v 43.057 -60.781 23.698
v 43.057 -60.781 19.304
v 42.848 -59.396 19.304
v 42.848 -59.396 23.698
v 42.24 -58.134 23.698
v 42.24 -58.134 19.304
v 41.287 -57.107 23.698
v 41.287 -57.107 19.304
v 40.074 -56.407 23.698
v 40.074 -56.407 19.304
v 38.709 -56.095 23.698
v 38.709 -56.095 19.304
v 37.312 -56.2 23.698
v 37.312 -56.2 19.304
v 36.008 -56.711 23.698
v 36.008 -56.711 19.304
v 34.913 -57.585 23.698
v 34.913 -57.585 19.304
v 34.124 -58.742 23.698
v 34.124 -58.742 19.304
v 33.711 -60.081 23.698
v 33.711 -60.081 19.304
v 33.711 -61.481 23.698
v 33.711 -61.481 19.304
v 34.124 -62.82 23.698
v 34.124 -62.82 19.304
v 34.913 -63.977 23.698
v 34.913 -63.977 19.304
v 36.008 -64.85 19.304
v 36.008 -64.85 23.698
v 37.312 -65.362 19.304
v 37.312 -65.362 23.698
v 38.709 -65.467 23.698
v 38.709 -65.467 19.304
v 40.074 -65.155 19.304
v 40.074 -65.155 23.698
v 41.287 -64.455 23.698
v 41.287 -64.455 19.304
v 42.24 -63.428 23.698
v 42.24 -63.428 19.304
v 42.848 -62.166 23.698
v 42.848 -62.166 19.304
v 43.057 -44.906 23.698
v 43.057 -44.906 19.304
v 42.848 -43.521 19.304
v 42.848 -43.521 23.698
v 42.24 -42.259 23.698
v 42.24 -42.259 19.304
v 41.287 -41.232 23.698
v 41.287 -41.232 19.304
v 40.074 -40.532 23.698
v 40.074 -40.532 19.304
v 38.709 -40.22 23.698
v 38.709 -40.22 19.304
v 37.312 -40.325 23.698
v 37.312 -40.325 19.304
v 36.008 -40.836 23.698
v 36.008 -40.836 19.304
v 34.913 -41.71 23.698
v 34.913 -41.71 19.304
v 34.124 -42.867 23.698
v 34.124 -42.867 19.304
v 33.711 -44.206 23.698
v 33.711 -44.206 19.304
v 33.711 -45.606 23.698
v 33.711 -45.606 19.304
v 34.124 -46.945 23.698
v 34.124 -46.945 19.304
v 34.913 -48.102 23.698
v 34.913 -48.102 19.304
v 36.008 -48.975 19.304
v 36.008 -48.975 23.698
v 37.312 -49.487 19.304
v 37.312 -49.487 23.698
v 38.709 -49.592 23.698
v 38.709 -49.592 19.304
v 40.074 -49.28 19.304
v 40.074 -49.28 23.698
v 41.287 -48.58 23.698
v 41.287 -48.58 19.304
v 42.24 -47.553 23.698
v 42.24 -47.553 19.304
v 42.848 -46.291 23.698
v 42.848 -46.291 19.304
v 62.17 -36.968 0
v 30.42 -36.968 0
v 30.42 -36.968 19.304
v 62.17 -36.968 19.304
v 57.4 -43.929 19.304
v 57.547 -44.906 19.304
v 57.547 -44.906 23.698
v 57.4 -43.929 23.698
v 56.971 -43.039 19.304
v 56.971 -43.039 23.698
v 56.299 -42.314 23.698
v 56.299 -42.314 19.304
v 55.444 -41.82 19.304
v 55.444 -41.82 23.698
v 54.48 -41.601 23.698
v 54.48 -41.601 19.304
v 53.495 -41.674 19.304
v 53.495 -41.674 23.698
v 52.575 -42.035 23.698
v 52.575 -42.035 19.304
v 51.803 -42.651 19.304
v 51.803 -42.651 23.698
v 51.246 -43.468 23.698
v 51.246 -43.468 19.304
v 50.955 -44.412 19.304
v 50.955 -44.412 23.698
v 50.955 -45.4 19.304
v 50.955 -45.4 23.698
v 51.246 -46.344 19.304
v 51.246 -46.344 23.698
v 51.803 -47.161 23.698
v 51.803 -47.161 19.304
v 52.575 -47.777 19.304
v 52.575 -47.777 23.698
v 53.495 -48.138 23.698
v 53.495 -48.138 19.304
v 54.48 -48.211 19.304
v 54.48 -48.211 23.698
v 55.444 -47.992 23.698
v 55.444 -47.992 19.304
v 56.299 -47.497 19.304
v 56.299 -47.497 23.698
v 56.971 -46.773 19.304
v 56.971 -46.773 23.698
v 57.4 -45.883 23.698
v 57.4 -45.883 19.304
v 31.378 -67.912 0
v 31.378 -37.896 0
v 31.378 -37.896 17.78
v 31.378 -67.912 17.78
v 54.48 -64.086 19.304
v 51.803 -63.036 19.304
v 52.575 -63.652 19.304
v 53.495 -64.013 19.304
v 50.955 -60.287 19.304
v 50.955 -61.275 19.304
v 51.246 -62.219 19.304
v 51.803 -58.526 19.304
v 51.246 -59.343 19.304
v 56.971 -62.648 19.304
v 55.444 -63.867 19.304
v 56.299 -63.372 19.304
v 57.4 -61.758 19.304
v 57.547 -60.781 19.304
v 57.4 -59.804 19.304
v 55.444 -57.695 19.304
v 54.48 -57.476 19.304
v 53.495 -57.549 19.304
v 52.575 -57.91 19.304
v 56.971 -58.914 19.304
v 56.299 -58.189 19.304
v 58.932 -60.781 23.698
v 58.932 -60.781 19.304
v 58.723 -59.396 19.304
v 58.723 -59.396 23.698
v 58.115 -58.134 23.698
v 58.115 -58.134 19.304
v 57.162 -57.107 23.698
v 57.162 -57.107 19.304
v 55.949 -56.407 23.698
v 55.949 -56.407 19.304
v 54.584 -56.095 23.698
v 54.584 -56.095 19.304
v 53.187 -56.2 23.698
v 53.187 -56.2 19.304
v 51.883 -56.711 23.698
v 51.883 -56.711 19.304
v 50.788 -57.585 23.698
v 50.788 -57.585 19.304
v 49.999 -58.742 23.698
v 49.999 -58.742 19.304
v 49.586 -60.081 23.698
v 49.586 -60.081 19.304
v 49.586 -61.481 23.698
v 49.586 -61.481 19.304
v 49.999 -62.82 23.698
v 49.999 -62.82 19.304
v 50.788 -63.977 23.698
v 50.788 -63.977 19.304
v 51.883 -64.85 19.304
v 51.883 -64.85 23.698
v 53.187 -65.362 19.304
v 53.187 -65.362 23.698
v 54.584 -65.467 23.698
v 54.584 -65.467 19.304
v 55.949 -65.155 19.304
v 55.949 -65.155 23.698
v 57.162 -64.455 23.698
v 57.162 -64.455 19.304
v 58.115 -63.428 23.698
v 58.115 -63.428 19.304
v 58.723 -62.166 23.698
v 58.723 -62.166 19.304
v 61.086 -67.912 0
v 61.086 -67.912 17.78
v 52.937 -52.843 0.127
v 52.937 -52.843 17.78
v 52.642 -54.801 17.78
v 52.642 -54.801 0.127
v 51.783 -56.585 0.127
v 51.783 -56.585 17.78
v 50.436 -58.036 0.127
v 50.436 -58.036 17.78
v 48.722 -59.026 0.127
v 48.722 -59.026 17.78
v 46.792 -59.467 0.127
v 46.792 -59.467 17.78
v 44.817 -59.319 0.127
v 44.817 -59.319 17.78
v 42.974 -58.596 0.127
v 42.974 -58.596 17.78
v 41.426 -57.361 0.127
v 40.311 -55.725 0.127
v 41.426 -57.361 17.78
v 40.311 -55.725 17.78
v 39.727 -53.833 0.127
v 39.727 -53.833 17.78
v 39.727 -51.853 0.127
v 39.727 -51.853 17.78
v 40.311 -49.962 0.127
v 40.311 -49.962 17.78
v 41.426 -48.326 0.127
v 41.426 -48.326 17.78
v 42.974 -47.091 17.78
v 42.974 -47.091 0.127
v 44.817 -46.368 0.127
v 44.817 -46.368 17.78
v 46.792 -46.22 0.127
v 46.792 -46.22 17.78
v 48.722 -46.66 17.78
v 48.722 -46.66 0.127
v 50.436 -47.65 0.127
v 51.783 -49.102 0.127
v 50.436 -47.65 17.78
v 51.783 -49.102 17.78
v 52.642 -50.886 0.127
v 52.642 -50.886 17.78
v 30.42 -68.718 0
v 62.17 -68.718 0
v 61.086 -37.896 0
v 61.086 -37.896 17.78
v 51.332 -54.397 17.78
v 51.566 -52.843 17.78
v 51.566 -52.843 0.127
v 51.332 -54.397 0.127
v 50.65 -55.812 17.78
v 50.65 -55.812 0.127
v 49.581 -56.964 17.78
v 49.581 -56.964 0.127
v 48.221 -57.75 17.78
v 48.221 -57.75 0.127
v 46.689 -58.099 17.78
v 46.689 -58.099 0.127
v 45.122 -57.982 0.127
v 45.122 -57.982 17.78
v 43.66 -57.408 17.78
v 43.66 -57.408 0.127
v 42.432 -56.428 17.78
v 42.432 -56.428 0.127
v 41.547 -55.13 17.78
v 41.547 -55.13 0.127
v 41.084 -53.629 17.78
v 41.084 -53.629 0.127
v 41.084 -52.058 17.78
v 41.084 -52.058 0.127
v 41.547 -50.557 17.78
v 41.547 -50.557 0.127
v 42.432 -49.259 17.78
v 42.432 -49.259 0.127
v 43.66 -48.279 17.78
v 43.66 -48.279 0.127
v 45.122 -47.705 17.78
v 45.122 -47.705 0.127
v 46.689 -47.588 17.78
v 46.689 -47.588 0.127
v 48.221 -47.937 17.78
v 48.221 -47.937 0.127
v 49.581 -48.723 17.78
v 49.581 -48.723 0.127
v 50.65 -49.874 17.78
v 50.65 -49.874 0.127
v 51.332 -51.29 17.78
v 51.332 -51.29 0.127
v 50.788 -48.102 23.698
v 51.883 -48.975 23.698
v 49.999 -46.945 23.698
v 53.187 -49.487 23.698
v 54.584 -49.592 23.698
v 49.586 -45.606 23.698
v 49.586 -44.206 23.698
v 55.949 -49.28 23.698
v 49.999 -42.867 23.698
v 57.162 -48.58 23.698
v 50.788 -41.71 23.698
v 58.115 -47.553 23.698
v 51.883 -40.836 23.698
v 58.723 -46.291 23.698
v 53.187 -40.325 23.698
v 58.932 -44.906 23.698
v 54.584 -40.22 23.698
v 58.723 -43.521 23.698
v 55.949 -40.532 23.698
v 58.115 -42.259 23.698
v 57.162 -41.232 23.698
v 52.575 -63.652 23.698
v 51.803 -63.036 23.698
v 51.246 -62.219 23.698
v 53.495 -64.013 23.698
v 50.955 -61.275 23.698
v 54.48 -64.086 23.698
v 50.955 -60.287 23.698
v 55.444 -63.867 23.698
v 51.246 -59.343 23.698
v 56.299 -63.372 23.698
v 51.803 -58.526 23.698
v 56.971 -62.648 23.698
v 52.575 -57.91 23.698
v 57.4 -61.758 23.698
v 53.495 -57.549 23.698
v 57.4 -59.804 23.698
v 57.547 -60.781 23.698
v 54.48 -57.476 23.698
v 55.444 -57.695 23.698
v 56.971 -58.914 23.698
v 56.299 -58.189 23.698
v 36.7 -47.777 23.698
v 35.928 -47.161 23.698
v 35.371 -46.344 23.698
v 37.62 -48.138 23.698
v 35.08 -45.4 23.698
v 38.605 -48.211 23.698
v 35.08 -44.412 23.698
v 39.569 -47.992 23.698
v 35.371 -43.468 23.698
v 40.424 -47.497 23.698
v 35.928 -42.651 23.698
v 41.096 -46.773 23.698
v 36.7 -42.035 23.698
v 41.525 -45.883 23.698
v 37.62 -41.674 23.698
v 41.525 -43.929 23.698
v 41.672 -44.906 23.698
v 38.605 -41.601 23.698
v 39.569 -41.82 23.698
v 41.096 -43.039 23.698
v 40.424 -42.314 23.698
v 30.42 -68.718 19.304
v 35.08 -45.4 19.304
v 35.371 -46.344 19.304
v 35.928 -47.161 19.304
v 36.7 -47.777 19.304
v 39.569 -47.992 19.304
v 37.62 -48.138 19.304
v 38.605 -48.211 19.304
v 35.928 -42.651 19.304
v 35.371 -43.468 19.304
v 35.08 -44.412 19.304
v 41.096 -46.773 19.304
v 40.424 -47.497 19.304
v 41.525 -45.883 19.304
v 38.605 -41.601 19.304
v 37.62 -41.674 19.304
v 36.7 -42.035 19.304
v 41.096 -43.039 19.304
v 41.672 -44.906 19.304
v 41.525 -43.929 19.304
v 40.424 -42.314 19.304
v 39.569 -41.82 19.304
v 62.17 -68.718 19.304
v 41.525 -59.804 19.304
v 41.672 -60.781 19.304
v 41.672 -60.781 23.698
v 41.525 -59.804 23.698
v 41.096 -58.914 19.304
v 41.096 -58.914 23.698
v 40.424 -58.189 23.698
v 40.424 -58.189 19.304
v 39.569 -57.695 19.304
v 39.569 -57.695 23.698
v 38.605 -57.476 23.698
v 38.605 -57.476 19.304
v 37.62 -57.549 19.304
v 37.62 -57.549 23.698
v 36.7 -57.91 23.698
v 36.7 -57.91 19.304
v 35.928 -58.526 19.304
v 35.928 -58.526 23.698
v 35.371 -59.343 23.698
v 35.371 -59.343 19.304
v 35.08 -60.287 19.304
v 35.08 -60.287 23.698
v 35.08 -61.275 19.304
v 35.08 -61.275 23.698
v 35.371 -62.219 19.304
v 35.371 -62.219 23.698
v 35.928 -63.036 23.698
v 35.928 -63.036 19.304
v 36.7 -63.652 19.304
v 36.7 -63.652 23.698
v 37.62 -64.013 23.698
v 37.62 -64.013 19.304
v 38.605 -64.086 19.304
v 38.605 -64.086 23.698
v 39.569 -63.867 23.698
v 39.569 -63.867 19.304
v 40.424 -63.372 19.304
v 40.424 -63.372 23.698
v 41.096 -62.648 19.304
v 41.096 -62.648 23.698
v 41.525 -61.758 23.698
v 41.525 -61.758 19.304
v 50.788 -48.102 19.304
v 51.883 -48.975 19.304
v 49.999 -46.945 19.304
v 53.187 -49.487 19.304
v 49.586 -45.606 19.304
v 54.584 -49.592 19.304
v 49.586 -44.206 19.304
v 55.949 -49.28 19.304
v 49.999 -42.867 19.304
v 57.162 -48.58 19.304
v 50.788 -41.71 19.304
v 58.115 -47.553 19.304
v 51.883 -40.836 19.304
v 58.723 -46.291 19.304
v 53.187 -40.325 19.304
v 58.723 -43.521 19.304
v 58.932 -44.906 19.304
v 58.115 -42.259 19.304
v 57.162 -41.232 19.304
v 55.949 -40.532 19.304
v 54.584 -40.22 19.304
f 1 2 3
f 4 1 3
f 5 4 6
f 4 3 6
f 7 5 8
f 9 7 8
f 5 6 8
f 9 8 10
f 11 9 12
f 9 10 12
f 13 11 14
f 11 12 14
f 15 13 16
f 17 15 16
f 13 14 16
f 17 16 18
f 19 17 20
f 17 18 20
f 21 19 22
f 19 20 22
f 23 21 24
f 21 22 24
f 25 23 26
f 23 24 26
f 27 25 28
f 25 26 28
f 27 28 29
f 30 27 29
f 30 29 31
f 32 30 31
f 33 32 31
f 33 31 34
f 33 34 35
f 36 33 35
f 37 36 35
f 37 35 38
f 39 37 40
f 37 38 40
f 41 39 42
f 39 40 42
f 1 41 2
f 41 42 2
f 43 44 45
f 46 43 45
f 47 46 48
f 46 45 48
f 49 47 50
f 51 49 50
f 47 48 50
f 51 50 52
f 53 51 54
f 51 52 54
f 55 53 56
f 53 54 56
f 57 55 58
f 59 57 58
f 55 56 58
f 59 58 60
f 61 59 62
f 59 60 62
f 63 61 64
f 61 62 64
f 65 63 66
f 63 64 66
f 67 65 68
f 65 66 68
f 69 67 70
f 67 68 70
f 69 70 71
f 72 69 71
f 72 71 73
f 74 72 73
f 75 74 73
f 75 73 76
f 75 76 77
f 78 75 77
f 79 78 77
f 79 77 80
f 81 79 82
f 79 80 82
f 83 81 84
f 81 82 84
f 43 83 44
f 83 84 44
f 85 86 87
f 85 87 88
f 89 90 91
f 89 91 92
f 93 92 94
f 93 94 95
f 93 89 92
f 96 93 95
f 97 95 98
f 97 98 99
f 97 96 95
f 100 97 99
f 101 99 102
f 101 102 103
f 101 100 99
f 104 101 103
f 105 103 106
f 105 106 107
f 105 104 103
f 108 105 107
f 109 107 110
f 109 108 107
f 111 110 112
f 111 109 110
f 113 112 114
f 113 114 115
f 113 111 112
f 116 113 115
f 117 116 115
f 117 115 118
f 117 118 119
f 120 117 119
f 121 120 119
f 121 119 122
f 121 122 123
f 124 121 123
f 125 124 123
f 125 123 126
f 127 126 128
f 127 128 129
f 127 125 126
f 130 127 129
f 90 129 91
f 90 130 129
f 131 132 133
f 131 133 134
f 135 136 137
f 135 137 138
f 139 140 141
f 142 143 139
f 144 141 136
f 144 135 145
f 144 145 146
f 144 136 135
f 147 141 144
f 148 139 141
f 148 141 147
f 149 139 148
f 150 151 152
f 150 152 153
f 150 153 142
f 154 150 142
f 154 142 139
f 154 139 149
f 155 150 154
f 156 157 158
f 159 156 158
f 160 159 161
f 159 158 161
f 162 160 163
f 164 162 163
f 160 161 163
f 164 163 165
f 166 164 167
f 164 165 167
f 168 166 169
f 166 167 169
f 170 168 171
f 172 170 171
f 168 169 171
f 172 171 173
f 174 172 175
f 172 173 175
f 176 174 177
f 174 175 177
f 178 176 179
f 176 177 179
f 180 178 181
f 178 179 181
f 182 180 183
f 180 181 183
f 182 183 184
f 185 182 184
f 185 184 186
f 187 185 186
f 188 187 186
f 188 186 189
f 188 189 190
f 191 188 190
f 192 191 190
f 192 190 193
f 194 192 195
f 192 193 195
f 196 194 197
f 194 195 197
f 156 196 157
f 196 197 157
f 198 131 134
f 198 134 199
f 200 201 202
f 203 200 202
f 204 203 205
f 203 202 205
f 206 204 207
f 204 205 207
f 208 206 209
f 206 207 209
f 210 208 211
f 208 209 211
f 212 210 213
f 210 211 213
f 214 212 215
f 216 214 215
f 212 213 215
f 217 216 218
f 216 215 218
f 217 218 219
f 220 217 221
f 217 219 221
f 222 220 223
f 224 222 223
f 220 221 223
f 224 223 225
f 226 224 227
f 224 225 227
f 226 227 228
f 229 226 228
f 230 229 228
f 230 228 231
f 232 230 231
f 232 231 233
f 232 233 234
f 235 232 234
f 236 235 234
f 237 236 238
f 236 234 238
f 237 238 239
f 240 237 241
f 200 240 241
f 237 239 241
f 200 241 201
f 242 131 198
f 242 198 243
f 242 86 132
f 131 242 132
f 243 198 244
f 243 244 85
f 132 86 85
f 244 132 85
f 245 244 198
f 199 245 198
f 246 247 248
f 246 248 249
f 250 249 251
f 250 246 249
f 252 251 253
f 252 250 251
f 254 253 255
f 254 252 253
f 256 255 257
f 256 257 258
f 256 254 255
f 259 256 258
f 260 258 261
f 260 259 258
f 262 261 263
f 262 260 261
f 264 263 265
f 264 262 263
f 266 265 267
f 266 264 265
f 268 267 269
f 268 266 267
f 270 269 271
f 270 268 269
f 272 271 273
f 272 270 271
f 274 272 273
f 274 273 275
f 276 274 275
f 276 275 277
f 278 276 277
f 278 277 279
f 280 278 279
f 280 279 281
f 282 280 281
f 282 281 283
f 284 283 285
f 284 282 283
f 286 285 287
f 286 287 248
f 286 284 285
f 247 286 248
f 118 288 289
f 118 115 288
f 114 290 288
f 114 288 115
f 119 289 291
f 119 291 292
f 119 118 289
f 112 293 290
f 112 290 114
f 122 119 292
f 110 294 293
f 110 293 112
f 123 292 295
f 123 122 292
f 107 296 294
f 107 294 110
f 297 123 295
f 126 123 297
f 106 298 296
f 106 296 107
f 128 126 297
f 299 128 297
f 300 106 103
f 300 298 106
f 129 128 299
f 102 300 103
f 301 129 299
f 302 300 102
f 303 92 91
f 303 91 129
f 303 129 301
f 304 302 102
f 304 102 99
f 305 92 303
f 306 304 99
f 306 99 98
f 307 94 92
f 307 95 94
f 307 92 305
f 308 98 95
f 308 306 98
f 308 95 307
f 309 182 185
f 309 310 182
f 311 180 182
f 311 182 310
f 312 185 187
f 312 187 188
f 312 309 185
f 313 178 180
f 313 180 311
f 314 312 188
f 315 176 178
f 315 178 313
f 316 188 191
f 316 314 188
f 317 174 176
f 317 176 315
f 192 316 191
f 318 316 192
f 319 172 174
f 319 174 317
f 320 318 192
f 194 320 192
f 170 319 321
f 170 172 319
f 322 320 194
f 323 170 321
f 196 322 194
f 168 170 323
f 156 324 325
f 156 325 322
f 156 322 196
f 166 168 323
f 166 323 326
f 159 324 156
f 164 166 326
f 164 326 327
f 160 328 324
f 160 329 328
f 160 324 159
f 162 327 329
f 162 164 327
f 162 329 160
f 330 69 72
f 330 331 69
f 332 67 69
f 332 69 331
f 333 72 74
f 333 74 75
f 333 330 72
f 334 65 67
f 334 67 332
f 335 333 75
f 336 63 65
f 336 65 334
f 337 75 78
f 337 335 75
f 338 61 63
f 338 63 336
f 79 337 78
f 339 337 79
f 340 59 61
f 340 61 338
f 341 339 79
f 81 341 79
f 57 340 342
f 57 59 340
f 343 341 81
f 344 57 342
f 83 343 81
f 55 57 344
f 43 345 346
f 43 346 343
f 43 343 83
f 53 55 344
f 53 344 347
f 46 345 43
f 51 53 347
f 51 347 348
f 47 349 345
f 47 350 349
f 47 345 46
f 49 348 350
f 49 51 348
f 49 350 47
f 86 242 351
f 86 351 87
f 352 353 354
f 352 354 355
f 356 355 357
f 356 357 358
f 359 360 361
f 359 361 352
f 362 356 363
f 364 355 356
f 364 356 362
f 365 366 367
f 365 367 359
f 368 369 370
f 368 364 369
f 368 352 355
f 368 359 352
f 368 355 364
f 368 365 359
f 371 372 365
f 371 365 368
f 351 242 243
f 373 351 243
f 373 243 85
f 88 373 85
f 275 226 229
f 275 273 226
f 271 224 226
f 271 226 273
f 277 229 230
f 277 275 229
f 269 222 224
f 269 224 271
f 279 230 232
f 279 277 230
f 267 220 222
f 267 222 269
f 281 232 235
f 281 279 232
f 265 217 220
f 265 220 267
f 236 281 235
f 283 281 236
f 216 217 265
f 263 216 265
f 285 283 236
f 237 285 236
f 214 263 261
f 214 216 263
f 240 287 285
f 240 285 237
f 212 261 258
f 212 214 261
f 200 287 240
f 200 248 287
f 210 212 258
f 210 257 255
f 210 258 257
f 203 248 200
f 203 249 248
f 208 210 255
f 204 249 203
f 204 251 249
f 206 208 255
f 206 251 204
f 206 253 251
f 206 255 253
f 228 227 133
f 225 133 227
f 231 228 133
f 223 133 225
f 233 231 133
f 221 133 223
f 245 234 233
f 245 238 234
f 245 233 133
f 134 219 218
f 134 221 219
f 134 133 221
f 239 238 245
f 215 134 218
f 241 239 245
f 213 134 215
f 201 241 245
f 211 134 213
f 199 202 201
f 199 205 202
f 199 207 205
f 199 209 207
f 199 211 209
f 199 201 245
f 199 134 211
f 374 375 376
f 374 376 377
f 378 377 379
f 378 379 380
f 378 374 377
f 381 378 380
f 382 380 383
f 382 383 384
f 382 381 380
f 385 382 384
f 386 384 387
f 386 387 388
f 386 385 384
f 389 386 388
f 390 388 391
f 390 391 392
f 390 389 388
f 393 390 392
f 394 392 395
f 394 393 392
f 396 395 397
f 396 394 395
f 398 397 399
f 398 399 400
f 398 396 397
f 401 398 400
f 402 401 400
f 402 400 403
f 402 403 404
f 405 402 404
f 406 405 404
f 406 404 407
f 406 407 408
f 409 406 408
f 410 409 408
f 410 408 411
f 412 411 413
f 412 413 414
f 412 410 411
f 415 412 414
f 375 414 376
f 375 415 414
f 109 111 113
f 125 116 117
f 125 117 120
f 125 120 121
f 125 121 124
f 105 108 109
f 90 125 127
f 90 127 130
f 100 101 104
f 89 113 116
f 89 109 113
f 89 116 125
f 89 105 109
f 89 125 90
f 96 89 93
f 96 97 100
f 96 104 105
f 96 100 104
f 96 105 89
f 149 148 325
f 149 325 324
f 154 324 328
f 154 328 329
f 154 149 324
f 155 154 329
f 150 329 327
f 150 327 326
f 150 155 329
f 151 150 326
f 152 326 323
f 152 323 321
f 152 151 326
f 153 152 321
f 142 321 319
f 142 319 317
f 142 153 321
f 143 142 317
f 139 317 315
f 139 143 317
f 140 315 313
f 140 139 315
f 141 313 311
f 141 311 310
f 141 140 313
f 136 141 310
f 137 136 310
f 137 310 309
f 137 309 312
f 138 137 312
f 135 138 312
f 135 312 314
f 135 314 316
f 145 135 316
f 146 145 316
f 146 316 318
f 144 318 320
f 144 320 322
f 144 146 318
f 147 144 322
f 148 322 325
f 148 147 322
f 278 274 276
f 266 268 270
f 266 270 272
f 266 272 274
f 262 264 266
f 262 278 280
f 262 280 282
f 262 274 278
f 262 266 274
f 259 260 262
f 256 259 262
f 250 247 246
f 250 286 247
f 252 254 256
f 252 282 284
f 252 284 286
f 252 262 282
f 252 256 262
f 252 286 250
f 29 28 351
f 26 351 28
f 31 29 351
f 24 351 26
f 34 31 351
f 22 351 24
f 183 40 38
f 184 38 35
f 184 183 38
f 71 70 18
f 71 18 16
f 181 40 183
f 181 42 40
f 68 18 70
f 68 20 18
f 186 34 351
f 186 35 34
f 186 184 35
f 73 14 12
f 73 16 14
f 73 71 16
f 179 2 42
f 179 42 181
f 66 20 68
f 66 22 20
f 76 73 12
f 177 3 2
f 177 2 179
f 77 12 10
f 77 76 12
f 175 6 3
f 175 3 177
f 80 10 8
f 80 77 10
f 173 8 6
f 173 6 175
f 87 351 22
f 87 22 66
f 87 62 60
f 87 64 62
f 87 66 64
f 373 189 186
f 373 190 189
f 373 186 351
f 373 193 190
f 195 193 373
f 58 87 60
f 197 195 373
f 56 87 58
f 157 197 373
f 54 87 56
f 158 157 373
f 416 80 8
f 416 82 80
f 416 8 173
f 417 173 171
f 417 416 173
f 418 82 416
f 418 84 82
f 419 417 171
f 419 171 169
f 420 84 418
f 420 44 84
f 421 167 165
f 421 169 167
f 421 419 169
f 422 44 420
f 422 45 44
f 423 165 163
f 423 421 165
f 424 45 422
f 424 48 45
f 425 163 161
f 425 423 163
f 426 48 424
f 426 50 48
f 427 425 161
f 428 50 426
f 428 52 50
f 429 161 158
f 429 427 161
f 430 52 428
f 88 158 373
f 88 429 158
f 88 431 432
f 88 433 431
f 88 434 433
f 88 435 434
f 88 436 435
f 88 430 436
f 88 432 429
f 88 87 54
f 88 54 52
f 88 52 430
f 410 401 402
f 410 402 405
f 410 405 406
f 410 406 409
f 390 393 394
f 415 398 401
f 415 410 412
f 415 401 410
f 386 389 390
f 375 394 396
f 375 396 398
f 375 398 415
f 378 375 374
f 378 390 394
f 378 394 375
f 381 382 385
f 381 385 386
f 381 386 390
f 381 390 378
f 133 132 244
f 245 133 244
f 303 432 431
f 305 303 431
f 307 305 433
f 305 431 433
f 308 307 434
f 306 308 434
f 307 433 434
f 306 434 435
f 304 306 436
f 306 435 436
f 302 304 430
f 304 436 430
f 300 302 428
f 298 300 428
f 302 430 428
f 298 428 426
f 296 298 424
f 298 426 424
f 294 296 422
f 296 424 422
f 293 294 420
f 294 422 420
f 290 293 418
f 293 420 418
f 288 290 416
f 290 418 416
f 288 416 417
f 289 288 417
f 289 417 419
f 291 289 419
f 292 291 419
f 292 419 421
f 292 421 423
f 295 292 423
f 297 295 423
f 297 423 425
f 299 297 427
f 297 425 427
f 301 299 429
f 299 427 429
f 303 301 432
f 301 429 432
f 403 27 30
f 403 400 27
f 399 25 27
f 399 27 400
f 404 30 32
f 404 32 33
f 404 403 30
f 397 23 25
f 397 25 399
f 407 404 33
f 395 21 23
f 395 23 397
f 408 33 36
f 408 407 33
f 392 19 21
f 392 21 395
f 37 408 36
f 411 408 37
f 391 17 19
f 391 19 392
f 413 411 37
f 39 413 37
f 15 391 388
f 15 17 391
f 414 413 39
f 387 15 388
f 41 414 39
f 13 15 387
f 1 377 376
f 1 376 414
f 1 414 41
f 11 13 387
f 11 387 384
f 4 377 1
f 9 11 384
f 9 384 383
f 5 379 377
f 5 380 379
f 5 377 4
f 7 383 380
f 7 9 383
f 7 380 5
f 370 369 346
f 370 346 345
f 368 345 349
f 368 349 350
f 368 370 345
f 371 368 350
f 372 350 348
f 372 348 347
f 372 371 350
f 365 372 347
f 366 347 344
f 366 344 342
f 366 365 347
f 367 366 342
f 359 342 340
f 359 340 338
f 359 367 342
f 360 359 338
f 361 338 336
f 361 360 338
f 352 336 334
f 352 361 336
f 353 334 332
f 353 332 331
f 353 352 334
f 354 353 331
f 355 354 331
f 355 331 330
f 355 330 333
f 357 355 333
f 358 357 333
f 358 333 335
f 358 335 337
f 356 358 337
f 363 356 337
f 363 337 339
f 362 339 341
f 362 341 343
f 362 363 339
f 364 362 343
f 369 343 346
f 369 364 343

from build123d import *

# Parameters (mm, degrees)
F0_W     = 31.75
F0_H     = 31.75
F1_DEPTH = 19.304
F2_R     = 4.699
F2_R_2   = 3.3147
F3_DEPTH = 4.3942
F4_W     = 29.70818
F4_H     = 30.016836
F5_DEPTH = 17.78
F7_R     = 6.6421
F7_R_2   = 5.2705
F8_DEPTH = 17.653


with BuildPart() as f1:
    # F0 (on Top) → F1 (new body)
    with BuildSketch(Plane.XY):
        with Locations((46.295215, -52.843441)):
            Rectangle(F0_W, F0_H)
    extrude(amount=F1_DEPTH)

    # F2 (on face) → F3 (join)
    with BuildSketch(Plane.XY.offset(19.304)):
        with Locations((38.357715, -44.905941)):
            Circle(F2_R)
        with Locations((38.357715, -44.905941)):
            Circle(F2_R_2, mode=Mode.SUBTRACT)
        with Locations((54.232715, -44.905941)):
            Circle(F2_R)
        with Locations((54.232715, -44.905941)):
            Circle(F2_R_2, mode=Mode.SUBTRACT)
        with Locations((54.232715, -60.780941)):
            Circle(F2_R)
        with Locations((54.232715, -60.780941)):
            Circle(F2_R_2, mode=Mode.SUBTRACT)
        with Locations((38.357715, -60.780941)):
            Circle(F2_R)
        with Locations((38.357715, -60.780941)):
            Circle(F2_R_2, mode=Mode.SUBTRACT)
    extrude(amount=F3_DEPTH)

    # F4 (on face) → F5 (cut)
    with BuildSketch(Plane(origin=(0, 0, 0), x_dir=(1, 0, 0), z_dir=(0, 0, -1))):
        with Locations((46.23173, 52.90393)):
            Rectangle(F4_W, F4_H)
    extrude(amount=-F5_DEPTH, mode=Mode.SUBTRACT)

    # F7 (on face) → F8 (join)
    with BuildSketch(Plane(origin=(0, 0, 17.78), x_dir=(1, 0, 0), z_dir=(0, 0, -1))):
        with Locations((46.295215, 52.843441)):
            Circle(F7_R)
        with Locations((46.295215, 52.843441)):
            Circle(F7_R_2, mode=Mode.SUBTRACT)
    extrude(amount=F8_DEPTH)


solid = f1.part
